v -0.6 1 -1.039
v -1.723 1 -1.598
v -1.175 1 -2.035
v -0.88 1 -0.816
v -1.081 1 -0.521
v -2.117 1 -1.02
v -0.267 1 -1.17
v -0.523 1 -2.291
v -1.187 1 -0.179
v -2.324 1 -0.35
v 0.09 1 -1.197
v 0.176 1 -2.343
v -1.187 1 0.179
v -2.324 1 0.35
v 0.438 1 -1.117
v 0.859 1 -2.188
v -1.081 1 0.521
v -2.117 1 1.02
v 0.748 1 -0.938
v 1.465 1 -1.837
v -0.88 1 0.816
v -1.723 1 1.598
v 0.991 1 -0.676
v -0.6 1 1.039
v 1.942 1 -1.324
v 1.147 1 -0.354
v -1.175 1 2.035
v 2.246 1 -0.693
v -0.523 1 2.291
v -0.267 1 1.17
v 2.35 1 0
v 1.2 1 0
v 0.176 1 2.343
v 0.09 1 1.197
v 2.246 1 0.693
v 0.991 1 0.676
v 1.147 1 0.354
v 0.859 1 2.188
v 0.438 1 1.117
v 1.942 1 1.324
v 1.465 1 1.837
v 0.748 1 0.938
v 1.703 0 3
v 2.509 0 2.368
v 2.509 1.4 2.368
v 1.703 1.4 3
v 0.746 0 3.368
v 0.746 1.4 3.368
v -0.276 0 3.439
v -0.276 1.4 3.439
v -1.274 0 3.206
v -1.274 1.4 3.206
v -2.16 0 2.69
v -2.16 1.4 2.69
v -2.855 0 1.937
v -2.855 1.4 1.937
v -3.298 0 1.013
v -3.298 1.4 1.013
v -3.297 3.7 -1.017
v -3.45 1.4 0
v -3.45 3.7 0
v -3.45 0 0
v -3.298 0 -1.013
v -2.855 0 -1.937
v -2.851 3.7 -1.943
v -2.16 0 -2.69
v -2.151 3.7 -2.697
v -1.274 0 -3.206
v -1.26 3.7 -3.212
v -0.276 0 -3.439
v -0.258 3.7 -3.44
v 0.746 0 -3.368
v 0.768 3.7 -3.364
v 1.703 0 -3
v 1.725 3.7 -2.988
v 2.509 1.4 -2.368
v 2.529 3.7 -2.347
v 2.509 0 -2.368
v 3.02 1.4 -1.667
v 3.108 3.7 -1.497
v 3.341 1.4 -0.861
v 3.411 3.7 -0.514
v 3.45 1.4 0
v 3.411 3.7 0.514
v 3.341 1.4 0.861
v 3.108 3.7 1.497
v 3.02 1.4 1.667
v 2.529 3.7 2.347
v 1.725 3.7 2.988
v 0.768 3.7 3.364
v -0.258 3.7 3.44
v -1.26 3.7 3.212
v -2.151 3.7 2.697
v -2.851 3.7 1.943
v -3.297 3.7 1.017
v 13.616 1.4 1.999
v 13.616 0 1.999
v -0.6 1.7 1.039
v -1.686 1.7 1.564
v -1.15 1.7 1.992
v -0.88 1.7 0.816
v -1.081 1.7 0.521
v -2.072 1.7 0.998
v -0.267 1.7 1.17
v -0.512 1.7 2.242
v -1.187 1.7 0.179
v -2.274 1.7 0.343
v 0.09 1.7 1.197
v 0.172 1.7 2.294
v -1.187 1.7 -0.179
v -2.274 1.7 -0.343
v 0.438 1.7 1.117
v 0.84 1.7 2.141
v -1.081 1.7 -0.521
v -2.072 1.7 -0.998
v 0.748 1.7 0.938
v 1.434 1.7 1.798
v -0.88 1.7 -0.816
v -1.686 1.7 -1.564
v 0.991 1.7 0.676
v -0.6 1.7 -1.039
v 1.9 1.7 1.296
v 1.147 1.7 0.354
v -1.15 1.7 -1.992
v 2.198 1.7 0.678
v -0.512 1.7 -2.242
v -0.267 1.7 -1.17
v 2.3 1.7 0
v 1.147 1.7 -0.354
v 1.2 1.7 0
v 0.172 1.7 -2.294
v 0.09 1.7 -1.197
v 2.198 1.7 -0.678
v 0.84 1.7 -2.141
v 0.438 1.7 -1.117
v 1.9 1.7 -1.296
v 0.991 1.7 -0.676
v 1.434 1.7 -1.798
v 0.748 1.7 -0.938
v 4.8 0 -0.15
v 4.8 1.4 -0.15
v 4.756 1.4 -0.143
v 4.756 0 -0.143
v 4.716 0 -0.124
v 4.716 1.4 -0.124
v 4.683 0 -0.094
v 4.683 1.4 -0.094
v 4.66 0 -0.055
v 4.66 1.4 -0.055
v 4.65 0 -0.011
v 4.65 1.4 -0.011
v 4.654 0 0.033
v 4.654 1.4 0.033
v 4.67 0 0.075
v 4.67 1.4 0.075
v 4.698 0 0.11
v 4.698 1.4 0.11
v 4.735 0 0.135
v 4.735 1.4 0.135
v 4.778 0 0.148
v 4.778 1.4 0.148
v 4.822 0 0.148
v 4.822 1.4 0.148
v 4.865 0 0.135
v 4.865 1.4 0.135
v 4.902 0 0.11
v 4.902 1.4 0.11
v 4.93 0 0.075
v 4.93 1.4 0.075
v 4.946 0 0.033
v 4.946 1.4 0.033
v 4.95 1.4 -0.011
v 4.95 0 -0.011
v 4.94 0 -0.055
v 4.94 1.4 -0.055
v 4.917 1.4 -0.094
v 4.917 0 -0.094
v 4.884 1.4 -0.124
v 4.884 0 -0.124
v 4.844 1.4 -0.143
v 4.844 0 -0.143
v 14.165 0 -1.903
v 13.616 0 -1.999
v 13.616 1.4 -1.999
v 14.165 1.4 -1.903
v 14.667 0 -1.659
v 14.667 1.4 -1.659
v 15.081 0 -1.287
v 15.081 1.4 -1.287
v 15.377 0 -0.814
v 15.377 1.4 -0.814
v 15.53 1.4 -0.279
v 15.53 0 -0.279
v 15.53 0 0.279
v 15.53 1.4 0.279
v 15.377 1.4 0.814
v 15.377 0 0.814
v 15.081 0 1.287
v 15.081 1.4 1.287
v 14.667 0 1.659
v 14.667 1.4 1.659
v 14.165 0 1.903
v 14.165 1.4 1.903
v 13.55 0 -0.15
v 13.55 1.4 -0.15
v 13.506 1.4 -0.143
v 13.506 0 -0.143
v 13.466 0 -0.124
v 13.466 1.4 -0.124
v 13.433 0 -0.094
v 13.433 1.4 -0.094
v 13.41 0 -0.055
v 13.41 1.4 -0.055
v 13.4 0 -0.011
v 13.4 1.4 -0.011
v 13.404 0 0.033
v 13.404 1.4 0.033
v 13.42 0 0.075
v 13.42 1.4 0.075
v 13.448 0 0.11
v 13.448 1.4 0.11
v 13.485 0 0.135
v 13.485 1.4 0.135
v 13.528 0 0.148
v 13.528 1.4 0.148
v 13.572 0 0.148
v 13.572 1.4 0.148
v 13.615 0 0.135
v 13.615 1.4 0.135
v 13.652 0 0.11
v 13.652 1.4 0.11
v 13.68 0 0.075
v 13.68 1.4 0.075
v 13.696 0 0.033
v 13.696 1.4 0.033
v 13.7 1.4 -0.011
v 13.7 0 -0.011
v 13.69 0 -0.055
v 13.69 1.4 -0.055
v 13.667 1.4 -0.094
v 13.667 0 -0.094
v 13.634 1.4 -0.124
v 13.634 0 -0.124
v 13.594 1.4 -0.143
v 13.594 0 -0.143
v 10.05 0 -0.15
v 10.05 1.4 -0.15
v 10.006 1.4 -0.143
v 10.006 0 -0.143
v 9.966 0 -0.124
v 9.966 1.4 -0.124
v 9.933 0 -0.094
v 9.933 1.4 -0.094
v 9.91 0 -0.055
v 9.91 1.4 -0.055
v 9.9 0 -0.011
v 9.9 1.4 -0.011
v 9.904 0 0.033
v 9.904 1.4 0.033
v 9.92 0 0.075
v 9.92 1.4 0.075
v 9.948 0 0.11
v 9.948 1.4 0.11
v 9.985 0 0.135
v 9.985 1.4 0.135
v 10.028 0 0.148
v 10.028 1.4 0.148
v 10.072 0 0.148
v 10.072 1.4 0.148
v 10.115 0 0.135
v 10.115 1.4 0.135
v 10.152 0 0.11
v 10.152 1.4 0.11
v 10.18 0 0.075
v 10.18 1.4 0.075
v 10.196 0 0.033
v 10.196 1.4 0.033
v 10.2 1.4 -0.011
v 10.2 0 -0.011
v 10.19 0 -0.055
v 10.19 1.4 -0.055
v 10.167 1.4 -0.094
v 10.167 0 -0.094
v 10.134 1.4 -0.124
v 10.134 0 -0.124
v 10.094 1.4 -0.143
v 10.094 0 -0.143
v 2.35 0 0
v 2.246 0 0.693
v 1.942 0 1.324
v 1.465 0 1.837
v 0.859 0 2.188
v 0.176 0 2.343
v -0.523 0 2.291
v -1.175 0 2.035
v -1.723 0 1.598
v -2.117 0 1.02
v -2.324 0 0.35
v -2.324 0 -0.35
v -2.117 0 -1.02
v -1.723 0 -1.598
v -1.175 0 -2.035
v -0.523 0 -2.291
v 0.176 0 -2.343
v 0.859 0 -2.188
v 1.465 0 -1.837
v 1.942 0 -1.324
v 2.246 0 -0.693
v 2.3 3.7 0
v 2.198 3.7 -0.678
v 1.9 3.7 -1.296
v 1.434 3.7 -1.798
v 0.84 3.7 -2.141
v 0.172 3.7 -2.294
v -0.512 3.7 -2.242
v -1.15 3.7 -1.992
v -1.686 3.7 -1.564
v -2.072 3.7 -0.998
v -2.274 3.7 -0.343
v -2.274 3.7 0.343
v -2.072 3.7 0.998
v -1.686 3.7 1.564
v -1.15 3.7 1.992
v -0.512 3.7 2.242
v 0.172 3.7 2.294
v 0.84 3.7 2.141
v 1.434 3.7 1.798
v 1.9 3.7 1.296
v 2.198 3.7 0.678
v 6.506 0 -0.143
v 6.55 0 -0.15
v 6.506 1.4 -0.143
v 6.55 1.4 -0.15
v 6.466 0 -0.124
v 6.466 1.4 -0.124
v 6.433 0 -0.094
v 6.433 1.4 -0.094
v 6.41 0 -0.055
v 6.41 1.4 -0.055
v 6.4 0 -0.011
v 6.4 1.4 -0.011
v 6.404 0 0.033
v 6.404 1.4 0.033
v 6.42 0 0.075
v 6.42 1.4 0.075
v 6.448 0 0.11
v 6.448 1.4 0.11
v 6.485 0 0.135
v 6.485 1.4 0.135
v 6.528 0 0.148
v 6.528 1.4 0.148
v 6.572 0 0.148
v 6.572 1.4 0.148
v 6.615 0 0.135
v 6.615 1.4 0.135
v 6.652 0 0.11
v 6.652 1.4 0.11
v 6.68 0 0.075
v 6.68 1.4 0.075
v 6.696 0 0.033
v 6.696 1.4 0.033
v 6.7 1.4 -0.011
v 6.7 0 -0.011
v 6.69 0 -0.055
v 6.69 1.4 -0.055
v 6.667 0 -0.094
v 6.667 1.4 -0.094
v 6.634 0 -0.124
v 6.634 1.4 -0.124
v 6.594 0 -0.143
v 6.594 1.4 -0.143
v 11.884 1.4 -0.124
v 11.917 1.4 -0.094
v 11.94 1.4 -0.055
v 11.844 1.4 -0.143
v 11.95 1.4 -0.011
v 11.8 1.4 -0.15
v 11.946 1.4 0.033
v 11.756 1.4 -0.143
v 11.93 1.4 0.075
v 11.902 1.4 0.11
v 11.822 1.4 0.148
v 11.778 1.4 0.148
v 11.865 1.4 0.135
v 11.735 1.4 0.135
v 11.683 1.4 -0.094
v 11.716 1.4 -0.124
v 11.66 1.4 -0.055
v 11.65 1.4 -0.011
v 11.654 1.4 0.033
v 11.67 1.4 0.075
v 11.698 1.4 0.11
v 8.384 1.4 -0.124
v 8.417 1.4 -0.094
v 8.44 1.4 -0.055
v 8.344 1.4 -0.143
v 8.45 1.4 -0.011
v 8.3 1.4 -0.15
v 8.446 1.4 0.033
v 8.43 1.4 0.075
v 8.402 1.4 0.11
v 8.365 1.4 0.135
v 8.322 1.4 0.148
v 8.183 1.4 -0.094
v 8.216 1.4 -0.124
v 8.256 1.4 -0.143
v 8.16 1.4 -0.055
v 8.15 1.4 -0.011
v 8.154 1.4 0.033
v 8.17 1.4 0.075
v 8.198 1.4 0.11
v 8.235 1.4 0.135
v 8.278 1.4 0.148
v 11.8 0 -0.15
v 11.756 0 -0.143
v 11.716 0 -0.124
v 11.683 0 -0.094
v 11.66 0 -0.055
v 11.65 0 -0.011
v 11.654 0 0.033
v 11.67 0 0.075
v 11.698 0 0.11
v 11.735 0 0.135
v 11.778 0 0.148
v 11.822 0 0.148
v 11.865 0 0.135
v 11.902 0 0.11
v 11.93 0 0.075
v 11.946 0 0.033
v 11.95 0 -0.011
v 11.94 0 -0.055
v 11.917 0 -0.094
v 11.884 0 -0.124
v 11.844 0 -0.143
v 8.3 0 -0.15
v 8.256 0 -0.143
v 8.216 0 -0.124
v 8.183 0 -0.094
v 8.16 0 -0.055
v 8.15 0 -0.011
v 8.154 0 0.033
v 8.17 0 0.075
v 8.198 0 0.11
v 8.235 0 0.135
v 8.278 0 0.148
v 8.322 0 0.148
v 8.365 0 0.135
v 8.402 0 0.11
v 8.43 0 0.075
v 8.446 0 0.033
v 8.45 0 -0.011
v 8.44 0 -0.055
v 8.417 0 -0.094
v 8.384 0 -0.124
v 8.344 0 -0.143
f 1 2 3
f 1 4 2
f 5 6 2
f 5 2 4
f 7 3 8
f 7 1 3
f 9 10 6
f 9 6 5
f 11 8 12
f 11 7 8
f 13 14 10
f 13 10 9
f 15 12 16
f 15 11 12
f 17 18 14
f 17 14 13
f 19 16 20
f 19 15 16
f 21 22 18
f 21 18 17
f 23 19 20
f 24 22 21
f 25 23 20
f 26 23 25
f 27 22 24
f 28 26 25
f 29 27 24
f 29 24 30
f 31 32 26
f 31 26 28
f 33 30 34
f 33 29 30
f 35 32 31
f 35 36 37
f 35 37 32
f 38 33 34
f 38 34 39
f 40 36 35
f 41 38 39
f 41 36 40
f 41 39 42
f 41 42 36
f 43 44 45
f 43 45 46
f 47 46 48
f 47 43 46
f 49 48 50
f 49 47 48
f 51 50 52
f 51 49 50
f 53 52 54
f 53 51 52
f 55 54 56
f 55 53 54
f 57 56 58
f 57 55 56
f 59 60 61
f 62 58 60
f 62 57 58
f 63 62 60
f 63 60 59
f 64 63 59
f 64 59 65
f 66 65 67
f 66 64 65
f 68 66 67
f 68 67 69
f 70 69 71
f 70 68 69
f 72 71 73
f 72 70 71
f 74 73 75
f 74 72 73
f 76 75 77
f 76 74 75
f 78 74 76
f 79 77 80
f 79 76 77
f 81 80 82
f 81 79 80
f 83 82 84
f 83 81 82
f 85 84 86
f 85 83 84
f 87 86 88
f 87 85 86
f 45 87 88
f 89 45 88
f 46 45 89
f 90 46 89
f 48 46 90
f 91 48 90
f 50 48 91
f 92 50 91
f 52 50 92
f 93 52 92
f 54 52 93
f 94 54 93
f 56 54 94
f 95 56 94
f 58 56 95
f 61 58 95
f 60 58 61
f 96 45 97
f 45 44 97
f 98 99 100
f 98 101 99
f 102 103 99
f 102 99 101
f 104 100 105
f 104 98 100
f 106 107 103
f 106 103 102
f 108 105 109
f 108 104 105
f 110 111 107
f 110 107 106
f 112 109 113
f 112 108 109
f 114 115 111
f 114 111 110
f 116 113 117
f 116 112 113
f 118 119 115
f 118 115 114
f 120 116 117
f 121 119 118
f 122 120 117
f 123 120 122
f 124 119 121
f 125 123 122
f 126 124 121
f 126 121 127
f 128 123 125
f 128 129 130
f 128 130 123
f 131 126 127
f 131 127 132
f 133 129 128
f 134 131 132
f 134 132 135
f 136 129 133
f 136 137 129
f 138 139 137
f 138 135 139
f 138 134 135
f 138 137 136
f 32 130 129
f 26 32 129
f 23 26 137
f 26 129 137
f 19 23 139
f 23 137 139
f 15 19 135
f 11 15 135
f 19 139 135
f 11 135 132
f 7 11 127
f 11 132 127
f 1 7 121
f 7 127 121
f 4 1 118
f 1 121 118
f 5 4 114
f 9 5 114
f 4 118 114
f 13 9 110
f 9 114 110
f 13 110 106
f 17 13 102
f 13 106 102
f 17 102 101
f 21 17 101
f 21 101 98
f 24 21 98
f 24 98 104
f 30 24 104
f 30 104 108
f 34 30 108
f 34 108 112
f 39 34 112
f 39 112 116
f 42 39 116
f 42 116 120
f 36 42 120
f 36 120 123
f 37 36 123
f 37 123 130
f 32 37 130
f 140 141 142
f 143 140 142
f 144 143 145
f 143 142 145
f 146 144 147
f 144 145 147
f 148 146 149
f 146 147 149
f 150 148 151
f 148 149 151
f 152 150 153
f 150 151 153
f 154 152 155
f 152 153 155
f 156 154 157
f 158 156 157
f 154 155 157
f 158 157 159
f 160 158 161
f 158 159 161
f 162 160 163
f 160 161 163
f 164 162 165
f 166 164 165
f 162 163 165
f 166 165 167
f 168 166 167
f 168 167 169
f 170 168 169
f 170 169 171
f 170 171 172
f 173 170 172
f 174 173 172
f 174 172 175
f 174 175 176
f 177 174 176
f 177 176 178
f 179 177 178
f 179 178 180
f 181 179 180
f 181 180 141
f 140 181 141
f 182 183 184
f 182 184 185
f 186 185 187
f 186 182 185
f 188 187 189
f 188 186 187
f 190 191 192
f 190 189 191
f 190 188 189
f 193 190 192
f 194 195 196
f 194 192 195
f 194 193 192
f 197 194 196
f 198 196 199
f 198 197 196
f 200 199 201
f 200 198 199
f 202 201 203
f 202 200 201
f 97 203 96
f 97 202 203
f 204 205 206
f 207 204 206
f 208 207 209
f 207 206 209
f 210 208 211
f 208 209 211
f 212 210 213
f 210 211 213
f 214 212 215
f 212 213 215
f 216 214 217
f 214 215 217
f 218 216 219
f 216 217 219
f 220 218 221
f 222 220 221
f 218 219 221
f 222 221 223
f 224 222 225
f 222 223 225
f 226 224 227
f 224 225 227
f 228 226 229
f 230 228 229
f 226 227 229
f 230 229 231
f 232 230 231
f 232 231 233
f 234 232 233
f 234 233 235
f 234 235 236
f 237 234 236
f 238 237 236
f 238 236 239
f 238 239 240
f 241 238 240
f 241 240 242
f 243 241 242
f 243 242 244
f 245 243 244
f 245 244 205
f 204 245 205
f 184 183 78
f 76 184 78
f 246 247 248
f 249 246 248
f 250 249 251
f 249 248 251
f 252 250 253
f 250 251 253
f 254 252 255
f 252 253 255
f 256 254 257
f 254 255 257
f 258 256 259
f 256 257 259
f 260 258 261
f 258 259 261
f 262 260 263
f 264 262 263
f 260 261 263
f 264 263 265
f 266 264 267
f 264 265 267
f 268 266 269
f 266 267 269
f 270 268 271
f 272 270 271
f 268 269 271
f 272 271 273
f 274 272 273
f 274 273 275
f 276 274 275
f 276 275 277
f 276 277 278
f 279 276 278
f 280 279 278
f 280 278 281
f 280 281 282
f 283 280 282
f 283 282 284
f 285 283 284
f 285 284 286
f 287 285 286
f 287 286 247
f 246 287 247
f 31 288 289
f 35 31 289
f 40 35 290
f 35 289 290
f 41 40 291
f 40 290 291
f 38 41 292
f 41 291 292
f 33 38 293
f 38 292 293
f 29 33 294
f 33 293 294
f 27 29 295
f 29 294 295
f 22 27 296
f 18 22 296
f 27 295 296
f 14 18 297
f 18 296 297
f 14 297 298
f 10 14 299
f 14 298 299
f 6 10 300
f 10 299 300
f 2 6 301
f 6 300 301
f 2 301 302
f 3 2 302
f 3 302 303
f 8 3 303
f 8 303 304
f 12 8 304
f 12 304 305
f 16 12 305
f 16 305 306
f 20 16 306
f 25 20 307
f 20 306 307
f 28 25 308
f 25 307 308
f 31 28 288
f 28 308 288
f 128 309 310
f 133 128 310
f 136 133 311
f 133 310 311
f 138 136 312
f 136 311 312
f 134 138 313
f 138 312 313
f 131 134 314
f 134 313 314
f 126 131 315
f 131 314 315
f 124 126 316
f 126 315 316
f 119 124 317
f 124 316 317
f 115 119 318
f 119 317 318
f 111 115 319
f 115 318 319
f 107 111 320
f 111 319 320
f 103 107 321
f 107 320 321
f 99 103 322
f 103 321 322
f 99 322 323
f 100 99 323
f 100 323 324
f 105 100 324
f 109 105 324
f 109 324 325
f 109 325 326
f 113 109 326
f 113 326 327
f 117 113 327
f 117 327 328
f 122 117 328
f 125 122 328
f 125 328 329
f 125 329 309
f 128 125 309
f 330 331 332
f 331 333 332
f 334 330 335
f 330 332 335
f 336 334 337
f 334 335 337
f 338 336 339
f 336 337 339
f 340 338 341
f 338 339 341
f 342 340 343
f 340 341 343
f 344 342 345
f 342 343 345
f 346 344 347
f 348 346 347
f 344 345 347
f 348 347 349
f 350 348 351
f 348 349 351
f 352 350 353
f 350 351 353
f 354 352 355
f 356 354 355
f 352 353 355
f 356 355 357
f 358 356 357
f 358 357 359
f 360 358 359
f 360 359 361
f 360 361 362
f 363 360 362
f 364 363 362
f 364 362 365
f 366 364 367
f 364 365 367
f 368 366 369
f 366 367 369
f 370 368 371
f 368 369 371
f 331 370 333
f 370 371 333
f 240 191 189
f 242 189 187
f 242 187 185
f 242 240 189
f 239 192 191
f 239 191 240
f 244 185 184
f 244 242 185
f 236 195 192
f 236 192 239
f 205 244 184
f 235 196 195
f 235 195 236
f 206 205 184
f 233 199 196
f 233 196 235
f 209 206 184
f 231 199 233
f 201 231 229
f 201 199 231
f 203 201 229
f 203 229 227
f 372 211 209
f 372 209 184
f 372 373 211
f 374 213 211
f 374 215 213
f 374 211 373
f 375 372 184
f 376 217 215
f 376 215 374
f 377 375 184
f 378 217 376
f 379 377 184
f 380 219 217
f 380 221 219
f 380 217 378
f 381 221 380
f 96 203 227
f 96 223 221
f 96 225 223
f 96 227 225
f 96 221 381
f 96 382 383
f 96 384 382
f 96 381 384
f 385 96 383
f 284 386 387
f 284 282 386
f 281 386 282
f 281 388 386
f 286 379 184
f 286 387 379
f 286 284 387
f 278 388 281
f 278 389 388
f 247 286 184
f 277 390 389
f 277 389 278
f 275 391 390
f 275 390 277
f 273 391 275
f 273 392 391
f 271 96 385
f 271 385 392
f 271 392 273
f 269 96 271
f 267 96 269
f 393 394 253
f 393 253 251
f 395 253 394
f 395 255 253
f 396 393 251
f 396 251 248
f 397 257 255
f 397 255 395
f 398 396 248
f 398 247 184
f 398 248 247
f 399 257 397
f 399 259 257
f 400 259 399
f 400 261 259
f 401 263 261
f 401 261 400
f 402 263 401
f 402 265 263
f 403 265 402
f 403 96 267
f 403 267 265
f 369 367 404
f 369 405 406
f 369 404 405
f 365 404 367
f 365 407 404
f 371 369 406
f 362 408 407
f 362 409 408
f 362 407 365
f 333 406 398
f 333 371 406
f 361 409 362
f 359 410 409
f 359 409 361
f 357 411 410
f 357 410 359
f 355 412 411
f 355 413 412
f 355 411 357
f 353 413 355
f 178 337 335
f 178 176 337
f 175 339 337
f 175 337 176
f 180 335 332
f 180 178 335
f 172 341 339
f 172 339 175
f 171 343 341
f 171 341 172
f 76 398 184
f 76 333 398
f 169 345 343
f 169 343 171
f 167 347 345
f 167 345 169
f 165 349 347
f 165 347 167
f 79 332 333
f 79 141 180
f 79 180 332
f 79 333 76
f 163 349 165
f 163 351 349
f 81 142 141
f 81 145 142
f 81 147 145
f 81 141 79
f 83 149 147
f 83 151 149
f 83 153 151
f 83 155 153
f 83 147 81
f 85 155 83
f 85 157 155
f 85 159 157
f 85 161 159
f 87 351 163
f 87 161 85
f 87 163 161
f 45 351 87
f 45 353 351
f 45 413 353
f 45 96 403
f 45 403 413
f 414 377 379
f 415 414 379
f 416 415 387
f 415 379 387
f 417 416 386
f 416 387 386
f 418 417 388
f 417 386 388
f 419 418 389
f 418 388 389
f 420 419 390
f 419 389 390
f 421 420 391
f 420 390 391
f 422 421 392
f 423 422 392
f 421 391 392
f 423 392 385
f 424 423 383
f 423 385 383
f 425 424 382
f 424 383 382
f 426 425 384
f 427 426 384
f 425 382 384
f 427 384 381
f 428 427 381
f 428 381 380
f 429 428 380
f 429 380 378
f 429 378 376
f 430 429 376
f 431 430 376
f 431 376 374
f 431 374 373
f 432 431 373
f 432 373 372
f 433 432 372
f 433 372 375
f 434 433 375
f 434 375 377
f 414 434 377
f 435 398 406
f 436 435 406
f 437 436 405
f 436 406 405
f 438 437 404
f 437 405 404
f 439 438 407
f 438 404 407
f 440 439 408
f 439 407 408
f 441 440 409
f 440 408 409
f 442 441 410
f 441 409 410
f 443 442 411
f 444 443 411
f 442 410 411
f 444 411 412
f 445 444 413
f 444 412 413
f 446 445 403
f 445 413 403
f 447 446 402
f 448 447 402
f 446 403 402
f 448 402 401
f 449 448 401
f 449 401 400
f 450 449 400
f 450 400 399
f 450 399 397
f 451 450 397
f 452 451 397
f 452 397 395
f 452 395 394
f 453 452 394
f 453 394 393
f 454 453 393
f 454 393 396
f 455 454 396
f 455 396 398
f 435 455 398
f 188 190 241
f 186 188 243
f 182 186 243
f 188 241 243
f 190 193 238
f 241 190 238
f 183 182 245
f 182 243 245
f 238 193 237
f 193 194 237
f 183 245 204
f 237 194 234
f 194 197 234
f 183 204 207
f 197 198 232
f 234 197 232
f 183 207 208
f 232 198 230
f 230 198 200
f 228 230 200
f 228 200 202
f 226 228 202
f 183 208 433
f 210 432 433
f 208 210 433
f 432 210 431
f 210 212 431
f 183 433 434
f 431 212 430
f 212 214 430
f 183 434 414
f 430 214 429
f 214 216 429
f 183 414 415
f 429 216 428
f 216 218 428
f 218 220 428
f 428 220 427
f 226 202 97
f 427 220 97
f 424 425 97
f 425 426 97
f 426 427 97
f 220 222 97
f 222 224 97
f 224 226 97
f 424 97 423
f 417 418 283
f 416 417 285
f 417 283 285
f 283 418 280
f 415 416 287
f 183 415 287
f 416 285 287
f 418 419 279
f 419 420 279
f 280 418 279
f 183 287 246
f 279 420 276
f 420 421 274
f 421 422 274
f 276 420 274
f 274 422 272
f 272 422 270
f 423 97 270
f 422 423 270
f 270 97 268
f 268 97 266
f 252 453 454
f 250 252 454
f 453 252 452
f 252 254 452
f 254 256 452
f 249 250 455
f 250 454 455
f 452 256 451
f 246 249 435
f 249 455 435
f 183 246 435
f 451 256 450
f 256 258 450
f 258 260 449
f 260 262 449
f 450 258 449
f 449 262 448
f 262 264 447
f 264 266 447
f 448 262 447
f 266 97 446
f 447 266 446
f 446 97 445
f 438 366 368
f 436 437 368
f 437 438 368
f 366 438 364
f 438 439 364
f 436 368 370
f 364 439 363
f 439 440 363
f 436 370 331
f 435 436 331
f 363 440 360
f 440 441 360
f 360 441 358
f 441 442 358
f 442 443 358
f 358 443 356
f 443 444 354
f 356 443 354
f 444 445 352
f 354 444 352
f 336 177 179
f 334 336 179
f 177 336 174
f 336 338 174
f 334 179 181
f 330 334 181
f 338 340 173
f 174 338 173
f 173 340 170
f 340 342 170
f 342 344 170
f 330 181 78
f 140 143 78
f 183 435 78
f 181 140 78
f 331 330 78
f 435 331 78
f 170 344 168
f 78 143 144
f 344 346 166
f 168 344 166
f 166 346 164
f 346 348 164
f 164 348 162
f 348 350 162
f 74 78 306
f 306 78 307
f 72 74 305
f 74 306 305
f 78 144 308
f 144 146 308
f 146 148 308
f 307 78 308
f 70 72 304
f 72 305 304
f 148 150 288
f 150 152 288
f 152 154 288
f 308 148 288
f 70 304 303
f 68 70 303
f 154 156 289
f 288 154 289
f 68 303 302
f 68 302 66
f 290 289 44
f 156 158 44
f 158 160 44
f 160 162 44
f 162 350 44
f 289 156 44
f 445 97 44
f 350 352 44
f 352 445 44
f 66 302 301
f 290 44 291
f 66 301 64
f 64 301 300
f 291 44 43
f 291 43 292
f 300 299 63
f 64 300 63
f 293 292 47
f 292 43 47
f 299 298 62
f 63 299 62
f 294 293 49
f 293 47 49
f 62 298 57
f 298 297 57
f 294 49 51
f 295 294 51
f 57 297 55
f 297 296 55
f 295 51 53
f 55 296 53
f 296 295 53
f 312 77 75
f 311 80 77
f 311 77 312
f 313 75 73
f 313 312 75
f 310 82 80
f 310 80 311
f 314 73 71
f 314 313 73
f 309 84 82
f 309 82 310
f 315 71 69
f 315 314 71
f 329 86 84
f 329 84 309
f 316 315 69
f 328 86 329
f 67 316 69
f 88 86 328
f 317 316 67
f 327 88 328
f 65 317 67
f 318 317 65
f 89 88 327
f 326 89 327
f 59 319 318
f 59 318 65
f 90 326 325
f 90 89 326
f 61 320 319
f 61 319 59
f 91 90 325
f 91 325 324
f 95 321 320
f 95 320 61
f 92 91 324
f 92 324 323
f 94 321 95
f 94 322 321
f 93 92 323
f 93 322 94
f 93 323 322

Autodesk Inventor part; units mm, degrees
ref_plane "YZ Plane" through (0, 0, 0) normal (1, 0, 0) x (0, 1, 0)
ref_plane "XZ Plane" through (0, 0, 0) normal (0, 1, 0) x (-1, 0, 0)
ref_plane "XY Plane" through (0, 0, 0) normal (0, 0, 1) x (1, 0, 0)
sketch "Sketch1" plane through (0, 0, 0) normal (0, 1, 0) x (-1, 0, 0)
  circle A0 centre (0, 0) radius 3.45
  line L0 (0, 0) -> (-13.55, 0) construction
  line L1 (-0.0814, 2.4486) -> (-13.6164, 1.9989)
  line L2 (-13.6164, -1.9989) -> (-0.0814, -2.4486)
  arc A1 (-0.0814, -2.4486) -> (-0.0814, 2.4486) centre (0, 0) ccw
  arc A2 (-13.6164, 1.9989) -> (-13.6164, -1.9989) centre (-13.55, 0) ccw
  point P0 (-6.775, 0)
  point P1 (-15.55, 0)
  point P2 (3.45, 0)
  dimension "d0" = 6.9
  dimension "d2" = 4
  dimension "d3" = 1
  dimension "d4" = 19
extrude "Extrusion1" add sketch "Sketch1" along normal blind 1.4
extrude "Extrusion2" add sketch "Sketch1" along normal blind 3.7 contours A0 L2 A1 L1 | L1 A1 L2 A0
sketch "Sketch2" plane through (0, 3.7, 0) normal (0, 1, 0) x (1, 0, 0)
  circle A0 centre (0, 0) radius 3.45 construction
  circle A1 centre (0, 0) radius 1.2
  dimension "d9" = 2.4
extrude "Extrusion3" cut sketch "Sketch2" against normal through all
sketch "Sketch3" plane through (0, 3.7, 0) normal (0, 1, 0) x (1, 0, 0)
  circle A0 centre (0, 0) radius 3.45 construction
  circle A1 centre (0, 0) radius 2.3
  dimension "d12" = 4.6
extrude "Extrusion4" cut sketch "Sketch3" against normal blind 2
sketch "Sketch4" plane through (0, 0, 0) normal (0, -1, 0) x (1, 0, 0)
  arc A0 (2.509, 2.368) -> (2.509, -2.368) centre (0, 0) ccw construction
  circle A1 centre (0, 0) radius 2.35
  dimension "d15" = 1.1
extrude "Extrusion5" cut sketch "Sketch4" against normal blind 1
sketch "Sketch5" plane through (0, 0, 0) normal (0, -1, 0) x (1, 0, 0)
  arc A0 (13.6164, -1.9989) -> (13.6164, 1.9989) centre (13.55, 0) ccw construction
  line L0 (13.55, 0) -> (10.05, 0)
  line L1 (10.05, 0) -> (6.55, 0)
  line L2 (6.55, 0) -> (3.05, 0)
  point P0 (8.3, 0)
  point P1 (4.8, 0)
  point P2 (11.8, 0)
  point P3 (4.8, 0)
  dimension "d18" = 3.5
hole "Hole1" at (13.55, 0, 0) at (10.05, 0, 0) at (8.3, 0, 0) at (6.55, 0, 0) at (4.8, 0, 0) at (11.8, 0, 0) direction (0, 1, 0) diameter 0.3 end through all
properties part number "SG90Horn1" material "PC/ABS Plastic"
